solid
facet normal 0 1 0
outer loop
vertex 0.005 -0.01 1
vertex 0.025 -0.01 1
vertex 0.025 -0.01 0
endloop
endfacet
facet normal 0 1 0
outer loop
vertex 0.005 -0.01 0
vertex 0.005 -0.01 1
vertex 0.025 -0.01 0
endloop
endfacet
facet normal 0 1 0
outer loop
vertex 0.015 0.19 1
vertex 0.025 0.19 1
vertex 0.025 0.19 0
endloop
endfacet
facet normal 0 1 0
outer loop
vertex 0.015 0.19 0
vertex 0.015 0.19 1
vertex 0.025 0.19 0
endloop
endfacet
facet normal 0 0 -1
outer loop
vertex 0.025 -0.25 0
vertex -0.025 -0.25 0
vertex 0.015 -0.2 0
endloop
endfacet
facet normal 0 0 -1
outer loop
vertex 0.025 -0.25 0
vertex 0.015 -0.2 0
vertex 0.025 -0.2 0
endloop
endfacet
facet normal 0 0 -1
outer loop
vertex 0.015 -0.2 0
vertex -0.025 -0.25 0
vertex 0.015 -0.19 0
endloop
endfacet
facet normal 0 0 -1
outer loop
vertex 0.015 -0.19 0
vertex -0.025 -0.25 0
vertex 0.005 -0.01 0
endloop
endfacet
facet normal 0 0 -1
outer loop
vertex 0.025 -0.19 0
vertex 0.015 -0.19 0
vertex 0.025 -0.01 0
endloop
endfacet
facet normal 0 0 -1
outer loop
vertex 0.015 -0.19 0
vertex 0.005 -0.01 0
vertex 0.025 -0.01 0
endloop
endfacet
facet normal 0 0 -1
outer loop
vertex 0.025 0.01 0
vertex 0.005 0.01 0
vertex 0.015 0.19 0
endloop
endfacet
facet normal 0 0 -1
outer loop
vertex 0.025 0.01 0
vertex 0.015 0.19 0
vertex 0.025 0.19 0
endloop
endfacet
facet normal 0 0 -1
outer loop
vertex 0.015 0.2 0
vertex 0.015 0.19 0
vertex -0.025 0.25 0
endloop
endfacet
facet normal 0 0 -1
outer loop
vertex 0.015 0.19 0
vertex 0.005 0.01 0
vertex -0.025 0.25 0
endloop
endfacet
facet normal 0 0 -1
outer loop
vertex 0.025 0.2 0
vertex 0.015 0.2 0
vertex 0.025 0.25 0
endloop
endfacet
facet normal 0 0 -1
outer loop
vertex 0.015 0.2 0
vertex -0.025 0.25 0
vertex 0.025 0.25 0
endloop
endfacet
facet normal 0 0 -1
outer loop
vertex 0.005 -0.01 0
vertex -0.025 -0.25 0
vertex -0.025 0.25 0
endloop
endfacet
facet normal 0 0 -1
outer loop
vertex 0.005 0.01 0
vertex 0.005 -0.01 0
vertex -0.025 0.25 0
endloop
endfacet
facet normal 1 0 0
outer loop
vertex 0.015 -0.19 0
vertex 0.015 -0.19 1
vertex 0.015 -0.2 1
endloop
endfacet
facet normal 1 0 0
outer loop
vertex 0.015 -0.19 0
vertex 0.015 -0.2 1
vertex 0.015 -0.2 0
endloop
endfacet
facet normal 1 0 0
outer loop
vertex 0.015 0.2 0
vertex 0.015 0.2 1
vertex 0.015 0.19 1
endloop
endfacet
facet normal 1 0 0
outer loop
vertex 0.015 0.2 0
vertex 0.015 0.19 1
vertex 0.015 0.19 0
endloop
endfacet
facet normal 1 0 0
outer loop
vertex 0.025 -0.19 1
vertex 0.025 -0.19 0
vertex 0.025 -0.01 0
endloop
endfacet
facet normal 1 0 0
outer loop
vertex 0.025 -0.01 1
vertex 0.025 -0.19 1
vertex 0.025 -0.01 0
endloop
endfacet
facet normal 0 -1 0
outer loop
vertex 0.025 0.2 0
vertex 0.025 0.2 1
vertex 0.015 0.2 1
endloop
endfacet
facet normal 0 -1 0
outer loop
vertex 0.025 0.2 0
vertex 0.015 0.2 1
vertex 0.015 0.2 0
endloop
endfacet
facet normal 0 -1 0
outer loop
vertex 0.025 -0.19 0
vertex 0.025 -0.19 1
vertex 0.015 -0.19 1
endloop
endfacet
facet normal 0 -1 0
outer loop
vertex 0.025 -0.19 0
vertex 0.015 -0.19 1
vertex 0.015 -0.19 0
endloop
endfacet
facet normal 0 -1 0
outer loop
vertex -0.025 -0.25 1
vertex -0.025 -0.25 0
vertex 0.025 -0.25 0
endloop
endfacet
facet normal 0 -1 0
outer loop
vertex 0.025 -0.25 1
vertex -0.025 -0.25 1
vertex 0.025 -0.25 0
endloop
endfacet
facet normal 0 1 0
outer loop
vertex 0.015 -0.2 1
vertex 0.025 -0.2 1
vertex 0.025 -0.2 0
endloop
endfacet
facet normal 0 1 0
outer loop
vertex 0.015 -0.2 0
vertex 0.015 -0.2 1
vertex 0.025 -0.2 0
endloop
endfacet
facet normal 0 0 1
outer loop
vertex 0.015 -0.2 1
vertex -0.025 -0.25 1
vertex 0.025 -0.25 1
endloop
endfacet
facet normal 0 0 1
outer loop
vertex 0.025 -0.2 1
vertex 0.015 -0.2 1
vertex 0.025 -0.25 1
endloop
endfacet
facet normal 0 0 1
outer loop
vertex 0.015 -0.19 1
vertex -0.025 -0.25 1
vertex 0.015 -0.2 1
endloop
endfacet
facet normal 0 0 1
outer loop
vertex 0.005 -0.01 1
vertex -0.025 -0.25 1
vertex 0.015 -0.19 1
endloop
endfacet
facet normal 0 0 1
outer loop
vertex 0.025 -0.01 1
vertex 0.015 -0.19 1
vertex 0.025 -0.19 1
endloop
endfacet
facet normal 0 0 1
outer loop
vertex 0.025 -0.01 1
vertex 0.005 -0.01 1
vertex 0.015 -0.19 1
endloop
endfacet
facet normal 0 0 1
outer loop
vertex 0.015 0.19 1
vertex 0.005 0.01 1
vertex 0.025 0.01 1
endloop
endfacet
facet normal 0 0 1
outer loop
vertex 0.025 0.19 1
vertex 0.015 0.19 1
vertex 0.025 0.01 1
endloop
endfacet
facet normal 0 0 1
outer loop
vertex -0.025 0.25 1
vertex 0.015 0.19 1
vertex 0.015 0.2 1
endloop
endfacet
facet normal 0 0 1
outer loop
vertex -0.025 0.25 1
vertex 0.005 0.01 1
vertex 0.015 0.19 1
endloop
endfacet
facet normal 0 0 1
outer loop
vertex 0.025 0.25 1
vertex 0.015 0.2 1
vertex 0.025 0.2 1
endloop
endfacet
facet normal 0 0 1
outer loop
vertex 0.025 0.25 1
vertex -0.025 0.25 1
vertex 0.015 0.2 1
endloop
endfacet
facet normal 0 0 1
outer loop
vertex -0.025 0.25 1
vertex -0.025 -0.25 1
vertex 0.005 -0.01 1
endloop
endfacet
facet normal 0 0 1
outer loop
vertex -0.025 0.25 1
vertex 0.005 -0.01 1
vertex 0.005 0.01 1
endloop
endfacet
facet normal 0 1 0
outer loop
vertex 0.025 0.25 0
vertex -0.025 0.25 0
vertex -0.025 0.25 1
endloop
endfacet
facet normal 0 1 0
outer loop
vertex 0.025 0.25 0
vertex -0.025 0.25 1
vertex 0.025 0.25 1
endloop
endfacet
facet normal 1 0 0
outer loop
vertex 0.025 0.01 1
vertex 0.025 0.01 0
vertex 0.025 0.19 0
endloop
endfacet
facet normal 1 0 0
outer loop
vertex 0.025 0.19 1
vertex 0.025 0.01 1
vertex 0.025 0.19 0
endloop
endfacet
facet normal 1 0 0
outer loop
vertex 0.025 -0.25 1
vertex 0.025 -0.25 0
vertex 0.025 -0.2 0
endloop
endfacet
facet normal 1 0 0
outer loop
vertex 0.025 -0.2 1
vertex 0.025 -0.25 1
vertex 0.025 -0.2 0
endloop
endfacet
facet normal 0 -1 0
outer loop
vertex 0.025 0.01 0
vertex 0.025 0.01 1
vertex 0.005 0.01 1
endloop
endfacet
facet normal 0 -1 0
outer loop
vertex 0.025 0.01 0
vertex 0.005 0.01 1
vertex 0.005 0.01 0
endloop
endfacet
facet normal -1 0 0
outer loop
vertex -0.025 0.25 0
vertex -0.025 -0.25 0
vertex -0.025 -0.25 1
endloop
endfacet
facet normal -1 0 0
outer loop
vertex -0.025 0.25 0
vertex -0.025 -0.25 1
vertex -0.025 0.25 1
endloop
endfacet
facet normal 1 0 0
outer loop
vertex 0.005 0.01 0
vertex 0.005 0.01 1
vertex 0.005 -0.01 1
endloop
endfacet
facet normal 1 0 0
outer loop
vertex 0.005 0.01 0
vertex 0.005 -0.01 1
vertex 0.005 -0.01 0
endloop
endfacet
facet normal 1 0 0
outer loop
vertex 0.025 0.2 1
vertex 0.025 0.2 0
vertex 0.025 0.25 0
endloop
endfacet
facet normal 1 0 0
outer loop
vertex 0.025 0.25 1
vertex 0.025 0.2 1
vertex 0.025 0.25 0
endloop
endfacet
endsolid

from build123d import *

# Parameters (mm, degrees)
IZIM1_W                     = 0.05
IZIM1_H                     = 0.5
Y_KSEKLIK_EKSTR_ZYON1_DEPTH = 1
IZIM2_W                     = 1
IZIM2_H                     = 0.01
KES_EKSTR_ZYON2_DEPTH       = 0.01
IZIM4_W                     = 1
IZIM4_H                     = 0.02
KES_EKSTR_ZYON3_DEPTH       = 0.02


with BuildPart() as part:
    # Çizim1 → Yükseklik-Ekstrüzyon1 (new body)
    with BuildSketch(Plane.XY):
        Rectangle(IZIM1_W, IZIM1_H)
    extrude(amount=Y_KSEKLIK_EKSTR_ZYON1_DEPTH)

    # Çizim2 → Kes-Ekstrüzyon2 (cut)
    with BuildSketch(Plane(origin=(0.025, 0, 0), x_dir=(0, 0, -1), z_dir=(1, 0, 0))):
        with Locations((-0.5, 0.195)):
            Rectangle(IZIM2_W, IZIM2_H)
        with Locations((-0.5, -0.195)):
            Rectangle(IZIM2_W, IZIM2_H)
    extrude(amount=-KES_EKSTR_ZYON2_DEPTH, mode=Mode.SUBTRACT)

    # Çizim4 → Kes-Ekstrüzyon3 (cut)
    with BuildSketch(Plane(origin=(0.025, 0, 0), x_dir=(0, 0, -1), z_dir=(1, 0, 0))):
        with Locations((-0.5, 0)):
            Rectangle(IZIM4_W, IZIM4_H)
    extrude(amount=-KES_EKSTR_ZYON3_DEPTH, mode=Mode.SUBTRACT)


solid = part.part
